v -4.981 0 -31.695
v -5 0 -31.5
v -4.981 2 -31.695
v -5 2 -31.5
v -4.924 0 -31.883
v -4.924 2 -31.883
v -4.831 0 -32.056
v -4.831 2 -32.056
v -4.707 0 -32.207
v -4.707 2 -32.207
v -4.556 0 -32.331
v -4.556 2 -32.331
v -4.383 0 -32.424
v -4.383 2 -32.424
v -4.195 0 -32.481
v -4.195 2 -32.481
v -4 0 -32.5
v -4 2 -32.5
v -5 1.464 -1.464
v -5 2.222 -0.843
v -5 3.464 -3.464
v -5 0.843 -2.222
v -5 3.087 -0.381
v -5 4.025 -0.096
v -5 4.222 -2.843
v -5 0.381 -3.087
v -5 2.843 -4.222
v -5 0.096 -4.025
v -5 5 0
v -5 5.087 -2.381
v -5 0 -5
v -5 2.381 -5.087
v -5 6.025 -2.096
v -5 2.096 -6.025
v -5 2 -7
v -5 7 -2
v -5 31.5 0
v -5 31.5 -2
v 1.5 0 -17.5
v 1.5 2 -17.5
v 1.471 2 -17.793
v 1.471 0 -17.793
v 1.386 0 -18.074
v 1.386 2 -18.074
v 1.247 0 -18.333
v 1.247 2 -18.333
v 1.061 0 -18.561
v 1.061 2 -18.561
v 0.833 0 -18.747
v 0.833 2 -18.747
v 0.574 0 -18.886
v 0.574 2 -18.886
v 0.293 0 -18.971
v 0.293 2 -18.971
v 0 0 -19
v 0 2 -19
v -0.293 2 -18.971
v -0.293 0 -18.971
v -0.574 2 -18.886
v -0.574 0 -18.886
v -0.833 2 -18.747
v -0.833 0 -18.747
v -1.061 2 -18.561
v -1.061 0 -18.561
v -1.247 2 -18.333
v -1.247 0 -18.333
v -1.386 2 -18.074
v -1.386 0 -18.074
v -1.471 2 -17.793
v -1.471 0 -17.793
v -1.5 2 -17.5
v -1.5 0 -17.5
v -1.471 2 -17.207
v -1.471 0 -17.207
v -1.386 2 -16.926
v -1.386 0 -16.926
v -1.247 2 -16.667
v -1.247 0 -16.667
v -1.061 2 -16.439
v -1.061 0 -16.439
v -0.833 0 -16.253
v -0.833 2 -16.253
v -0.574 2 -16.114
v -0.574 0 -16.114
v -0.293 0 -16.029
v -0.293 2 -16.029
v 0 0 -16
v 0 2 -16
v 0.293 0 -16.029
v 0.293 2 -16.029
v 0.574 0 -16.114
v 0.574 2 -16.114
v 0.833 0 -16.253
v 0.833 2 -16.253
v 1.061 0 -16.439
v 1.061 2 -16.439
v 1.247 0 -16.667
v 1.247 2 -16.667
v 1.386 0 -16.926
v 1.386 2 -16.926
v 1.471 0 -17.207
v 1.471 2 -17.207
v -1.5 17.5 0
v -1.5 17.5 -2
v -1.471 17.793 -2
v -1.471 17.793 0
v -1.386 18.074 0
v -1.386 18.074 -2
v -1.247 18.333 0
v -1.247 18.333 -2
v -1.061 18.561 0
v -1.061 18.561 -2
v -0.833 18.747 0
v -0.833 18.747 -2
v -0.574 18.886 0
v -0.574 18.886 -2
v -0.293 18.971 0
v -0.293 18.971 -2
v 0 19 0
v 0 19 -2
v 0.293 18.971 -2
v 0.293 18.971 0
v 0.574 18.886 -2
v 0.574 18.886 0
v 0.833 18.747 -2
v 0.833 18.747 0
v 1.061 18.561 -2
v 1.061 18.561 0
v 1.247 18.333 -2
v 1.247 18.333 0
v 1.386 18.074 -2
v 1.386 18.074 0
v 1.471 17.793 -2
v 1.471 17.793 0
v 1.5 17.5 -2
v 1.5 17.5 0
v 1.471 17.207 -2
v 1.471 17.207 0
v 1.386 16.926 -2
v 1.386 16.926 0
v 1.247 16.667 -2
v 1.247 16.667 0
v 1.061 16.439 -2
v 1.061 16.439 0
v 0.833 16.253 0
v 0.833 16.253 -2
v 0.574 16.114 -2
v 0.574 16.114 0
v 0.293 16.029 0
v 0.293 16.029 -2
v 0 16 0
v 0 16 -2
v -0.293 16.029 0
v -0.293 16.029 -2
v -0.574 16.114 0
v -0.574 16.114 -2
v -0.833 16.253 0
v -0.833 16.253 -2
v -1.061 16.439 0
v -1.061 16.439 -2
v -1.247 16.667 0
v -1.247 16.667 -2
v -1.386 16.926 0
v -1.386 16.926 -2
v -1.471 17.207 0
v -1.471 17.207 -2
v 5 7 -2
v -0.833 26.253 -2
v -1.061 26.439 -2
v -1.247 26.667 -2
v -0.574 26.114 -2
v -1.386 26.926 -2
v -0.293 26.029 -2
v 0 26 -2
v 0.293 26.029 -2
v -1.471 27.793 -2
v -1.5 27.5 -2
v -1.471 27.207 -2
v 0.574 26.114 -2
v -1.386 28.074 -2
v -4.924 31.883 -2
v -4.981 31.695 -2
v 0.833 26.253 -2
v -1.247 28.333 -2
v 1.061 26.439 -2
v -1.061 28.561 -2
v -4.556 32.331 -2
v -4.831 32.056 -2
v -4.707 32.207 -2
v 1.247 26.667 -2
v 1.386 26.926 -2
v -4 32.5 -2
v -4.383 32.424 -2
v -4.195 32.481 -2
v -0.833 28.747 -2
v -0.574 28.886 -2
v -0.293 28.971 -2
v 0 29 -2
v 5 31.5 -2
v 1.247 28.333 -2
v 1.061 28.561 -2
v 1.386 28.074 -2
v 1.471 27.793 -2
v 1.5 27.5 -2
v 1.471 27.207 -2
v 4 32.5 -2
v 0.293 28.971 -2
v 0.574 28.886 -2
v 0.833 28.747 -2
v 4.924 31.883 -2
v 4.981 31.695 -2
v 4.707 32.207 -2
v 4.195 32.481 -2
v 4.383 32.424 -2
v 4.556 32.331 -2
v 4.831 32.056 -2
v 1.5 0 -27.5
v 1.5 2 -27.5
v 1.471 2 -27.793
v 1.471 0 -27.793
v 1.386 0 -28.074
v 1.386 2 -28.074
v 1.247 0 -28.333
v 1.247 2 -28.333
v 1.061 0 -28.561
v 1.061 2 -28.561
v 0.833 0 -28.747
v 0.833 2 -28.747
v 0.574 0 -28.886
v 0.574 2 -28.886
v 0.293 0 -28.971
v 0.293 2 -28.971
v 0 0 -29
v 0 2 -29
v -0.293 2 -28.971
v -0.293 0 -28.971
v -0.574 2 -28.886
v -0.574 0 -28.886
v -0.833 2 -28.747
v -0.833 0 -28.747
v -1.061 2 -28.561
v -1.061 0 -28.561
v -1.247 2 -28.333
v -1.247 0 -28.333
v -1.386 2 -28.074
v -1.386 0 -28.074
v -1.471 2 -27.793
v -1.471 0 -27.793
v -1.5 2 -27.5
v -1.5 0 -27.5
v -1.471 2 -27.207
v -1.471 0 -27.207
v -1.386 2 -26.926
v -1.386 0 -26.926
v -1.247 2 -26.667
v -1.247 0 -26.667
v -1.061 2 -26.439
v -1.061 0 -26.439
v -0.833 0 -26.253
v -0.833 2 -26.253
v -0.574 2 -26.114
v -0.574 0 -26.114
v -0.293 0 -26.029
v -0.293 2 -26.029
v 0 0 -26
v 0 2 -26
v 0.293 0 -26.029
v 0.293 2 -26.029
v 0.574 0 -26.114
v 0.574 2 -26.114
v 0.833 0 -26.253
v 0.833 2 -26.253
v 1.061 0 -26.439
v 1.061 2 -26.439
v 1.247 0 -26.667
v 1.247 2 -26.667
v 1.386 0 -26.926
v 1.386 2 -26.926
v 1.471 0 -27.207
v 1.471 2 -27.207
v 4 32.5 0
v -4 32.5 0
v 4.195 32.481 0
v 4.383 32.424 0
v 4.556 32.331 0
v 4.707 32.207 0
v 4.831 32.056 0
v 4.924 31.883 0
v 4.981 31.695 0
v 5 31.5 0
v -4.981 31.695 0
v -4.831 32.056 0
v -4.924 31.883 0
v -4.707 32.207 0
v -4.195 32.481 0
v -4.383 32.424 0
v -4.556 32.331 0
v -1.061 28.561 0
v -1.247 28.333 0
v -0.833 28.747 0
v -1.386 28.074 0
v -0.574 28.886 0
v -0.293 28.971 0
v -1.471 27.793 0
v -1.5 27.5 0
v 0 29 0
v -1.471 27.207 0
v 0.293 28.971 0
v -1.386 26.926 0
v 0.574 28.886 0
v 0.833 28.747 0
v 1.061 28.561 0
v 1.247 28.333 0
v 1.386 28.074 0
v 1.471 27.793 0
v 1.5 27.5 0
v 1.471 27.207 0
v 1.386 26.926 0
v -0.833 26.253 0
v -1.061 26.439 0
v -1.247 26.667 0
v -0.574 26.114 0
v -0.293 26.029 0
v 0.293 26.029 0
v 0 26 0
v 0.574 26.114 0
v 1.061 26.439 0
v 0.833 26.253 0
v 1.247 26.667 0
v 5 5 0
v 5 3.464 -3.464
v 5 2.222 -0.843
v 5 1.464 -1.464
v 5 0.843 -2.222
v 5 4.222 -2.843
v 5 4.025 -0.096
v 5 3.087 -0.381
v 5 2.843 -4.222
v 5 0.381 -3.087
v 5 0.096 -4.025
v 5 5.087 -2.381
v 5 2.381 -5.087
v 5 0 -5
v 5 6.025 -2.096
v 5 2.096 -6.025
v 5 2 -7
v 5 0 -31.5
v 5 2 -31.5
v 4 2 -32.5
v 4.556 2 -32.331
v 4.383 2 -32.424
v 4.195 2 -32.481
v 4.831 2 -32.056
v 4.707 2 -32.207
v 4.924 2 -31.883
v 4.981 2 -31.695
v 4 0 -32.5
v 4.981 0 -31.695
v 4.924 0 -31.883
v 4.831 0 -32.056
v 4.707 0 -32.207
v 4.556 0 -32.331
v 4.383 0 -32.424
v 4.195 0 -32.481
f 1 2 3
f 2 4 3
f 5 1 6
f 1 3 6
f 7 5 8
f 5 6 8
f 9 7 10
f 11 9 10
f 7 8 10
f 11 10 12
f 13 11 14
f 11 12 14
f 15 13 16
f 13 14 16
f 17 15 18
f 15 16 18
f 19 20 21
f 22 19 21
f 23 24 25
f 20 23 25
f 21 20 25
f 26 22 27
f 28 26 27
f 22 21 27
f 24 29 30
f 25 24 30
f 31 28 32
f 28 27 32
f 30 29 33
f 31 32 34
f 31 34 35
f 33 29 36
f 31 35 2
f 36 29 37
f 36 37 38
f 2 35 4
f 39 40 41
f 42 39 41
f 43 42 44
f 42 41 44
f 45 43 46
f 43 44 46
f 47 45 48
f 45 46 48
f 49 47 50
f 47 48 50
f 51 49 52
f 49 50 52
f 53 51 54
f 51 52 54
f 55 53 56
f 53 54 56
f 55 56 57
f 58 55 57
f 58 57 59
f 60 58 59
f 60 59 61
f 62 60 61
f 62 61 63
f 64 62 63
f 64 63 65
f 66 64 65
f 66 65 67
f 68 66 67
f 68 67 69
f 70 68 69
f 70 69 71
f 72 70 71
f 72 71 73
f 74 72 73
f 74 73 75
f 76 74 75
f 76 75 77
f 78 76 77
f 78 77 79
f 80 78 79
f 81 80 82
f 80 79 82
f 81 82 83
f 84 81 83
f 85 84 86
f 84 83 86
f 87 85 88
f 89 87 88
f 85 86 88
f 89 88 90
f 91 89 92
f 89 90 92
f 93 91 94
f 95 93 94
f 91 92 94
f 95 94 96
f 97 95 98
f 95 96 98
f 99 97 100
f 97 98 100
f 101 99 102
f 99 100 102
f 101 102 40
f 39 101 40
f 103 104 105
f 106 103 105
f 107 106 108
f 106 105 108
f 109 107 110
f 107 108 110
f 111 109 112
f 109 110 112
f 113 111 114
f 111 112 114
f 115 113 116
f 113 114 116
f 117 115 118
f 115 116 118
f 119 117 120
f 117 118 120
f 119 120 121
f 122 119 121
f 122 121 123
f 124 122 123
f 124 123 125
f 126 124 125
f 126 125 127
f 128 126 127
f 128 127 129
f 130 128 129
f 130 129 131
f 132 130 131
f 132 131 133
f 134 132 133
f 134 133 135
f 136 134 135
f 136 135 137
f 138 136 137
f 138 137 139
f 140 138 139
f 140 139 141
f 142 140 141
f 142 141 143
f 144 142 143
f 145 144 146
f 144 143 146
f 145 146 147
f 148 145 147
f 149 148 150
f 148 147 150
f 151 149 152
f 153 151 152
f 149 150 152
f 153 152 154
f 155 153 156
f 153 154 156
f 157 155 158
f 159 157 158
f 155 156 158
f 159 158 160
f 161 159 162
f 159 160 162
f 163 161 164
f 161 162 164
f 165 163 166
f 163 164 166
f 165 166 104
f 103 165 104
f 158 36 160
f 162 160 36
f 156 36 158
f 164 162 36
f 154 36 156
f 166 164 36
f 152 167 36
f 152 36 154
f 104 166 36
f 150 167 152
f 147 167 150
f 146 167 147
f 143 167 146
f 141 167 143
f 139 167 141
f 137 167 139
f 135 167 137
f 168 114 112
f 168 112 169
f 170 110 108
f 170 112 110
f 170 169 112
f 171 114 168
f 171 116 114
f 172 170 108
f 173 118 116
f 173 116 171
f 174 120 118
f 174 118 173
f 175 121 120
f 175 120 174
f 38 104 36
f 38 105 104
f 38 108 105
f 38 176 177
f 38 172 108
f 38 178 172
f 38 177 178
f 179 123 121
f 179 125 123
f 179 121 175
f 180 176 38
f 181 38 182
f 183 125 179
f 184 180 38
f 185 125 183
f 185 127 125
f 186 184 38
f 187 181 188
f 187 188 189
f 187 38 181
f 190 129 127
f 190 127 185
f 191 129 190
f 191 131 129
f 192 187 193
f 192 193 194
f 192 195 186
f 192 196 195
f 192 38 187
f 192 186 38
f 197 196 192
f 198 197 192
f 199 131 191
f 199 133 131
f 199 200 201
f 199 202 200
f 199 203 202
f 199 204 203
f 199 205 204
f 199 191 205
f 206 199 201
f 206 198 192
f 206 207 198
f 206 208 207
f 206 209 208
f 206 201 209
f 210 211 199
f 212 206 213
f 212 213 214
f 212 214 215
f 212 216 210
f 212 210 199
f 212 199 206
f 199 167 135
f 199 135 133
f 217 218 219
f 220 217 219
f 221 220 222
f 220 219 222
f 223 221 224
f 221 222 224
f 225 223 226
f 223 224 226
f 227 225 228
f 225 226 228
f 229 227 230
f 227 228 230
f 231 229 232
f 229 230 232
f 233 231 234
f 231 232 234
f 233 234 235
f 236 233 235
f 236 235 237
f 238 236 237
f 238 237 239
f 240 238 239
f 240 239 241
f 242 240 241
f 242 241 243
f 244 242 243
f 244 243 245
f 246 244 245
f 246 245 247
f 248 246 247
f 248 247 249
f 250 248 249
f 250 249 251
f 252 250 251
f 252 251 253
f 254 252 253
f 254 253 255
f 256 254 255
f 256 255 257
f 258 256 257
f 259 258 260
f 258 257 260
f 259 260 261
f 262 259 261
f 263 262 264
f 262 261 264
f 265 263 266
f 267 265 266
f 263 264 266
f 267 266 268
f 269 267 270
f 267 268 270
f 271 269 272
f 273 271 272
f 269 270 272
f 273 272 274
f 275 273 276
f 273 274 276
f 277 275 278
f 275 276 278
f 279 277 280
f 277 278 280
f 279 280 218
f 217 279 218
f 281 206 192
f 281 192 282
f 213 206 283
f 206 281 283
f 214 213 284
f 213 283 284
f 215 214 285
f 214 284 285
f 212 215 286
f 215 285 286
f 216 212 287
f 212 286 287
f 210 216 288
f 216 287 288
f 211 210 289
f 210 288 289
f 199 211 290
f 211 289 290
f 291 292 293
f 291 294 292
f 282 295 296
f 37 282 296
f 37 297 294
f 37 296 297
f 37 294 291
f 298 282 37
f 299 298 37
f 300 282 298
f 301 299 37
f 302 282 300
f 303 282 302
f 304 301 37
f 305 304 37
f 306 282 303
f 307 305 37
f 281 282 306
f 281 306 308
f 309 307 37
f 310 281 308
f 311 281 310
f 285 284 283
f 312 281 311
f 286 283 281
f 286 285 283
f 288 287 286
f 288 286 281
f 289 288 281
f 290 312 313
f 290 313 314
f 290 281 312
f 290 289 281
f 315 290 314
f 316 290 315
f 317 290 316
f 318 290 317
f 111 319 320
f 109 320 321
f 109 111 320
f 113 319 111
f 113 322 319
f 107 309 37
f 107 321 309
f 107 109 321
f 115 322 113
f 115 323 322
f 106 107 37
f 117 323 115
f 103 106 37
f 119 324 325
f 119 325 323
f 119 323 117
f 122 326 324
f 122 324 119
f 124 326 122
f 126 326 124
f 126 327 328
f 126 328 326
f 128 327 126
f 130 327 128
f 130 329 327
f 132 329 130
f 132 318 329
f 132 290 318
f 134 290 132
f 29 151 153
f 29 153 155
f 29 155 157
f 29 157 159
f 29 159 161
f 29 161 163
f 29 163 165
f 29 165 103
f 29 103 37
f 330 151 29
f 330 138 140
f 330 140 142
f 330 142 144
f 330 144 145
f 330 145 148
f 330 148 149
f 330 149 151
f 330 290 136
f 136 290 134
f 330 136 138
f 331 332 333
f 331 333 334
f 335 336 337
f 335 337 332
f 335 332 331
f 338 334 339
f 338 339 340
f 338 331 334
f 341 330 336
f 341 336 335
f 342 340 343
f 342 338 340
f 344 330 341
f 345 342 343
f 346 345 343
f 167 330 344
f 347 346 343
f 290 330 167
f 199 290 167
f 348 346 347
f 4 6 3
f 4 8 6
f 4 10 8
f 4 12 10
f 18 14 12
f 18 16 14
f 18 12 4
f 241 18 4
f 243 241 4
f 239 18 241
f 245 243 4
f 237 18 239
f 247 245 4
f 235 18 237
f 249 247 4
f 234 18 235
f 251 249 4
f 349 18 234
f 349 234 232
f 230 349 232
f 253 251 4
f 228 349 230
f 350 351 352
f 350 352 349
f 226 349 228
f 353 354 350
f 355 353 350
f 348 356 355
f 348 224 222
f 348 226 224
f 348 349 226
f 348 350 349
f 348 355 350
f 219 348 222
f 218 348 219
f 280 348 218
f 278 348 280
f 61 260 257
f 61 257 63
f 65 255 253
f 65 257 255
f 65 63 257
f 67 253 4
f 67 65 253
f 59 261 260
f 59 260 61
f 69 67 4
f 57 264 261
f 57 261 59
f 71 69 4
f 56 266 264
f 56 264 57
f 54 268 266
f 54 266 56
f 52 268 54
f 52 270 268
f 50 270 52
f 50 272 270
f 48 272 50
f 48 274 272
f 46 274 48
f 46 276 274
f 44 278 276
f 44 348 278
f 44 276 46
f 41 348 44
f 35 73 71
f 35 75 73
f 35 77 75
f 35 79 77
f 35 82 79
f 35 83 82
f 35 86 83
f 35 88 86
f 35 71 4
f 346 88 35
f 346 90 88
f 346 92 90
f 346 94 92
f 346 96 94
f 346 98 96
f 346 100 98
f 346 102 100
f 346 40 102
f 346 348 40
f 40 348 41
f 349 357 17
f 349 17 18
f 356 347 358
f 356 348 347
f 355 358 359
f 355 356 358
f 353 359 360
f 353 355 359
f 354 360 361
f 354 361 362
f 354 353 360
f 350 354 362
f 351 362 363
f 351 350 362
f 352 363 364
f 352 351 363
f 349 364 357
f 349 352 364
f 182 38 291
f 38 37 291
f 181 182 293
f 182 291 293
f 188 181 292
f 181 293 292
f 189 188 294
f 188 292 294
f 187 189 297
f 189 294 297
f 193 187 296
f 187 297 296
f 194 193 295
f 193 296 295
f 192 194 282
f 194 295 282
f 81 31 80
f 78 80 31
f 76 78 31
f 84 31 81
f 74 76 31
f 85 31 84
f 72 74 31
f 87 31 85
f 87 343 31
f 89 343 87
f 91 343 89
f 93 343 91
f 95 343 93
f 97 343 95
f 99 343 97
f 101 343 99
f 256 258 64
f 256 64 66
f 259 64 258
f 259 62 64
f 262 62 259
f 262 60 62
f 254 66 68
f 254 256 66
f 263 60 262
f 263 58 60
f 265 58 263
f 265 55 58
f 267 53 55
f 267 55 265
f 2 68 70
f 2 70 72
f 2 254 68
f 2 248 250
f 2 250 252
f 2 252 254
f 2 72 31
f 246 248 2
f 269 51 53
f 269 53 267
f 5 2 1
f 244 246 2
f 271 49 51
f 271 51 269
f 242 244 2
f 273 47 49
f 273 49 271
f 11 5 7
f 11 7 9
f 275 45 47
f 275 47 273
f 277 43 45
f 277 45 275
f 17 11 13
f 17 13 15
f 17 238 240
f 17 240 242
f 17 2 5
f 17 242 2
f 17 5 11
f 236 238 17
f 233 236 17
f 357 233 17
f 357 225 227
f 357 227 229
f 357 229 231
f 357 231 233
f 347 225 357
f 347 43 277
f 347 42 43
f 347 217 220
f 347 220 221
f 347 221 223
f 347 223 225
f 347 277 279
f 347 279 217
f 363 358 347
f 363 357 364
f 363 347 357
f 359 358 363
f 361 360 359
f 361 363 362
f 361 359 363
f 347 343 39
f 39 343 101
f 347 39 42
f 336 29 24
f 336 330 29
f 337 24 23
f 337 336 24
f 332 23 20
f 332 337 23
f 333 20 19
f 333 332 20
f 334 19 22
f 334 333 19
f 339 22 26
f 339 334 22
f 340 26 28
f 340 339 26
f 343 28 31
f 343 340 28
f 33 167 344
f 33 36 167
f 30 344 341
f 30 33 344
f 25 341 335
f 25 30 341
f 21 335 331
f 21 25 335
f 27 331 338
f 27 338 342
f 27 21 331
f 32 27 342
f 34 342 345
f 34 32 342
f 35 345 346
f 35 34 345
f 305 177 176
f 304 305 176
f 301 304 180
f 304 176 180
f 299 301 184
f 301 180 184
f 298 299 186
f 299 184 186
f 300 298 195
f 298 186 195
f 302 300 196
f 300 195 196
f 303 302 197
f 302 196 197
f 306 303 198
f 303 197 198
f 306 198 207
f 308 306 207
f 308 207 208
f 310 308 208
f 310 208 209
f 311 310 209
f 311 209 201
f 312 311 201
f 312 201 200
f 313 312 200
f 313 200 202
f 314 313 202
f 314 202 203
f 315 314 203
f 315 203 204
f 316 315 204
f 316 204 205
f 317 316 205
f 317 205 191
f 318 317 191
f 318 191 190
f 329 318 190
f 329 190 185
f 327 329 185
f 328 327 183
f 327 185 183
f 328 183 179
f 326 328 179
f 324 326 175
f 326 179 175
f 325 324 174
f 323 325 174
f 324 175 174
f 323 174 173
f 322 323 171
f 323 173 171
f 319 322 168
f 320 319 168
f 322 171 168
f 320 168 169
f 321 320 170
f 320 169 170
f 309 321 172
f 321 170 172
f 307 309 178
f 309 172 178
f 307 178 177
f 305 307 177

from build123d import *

# Parameters (mm, degrees)
EXTRUDE_1_DEPTH      = 5
EXTRUDE_1_DEPTH_BACK = 5
SKETCH_2_R           = 1.5
CUT_EXTRUDE_1_DEPTH  = 45.849749163
SKETCH_3_R           = 1.5
CUT_EXTRUDE_2_DEPTH  = 45.849749163
FILLET_1_R           = 1
FILLET_2_R           = 5


with BuildPart() as part:
    # Эскиз1 → Бобышка-Вытянуть1 (new, two sides: drawn at the far end of the back side and taken through both)
    with BuildSketch(Plane(origin=(0, 0, 0), x_dir=(0, 0, -1), z_dir=(1, 0, 0)).offset(-EXTRUDE_1_DEPTH_BACK)):
        Polygon((0, 32.5), (0, 0), (32.5, 0), (32.5, 2), (2, 2), (2, 32.5), align=None)
    extrude(amount=EXTRUDE_1_DEPTH + EXTRUDE_1_DEPTH_BACK)

    # Эскиз2 → Вырез-Вытянуть1 (cut, through all)
    with BuildSketch(Plane(origin=(0, 2, 0), x_dir=(1, 0, 0), z_dir=(0, 1, 0))):
        with Locations((0, 27.5)):
            Circle(SKETCH_2_R)
        with Locations((0, 17.5)):
            Circle(SKETCH_2_R)
    extrude(amount=-CUT_EXTRUDE_1_DEPTH, mode=Mode.SUBTRACT)

    # Эскиз3 → Вырез-Вытянуть2 (cut, through all)
    with BuildSketch(Plane(origin=(0, 0, -2), x_dir=(-1, 0, 0), z_dir=(0, 0, -1))):
        with Locations((0, 27.5)):
            Circle(SKETCH_3_R)
        with Locations((0, 17.5)):
            Circle(SKETCH_3_R)
    extrude(amount=-CUT_EXTRUDE_2_DEPTH, mode=Mode.SUBTRACT)

    # Скругление1
    fillet_1_edges = [part.edges().sort_by_distance(p)[0] for p in [
        (-5, 1, -32.5),
        (5, 1, -32.5),
        (5, 32.5, -1),
        (-5, 32.5, -1),
    ]]
    fillet(fillet_1_edges, radius=FILLET_1_R)

    # Скругление2
    fillet_2_edges = [part.edges().sort_by_distance(p)[0] for p in [
        (0, 0, 0),
        (0, 2, -2),
    ]]
    fillet(fillet_2_edges, radius=FILLET_2_R)


solid = part.part
